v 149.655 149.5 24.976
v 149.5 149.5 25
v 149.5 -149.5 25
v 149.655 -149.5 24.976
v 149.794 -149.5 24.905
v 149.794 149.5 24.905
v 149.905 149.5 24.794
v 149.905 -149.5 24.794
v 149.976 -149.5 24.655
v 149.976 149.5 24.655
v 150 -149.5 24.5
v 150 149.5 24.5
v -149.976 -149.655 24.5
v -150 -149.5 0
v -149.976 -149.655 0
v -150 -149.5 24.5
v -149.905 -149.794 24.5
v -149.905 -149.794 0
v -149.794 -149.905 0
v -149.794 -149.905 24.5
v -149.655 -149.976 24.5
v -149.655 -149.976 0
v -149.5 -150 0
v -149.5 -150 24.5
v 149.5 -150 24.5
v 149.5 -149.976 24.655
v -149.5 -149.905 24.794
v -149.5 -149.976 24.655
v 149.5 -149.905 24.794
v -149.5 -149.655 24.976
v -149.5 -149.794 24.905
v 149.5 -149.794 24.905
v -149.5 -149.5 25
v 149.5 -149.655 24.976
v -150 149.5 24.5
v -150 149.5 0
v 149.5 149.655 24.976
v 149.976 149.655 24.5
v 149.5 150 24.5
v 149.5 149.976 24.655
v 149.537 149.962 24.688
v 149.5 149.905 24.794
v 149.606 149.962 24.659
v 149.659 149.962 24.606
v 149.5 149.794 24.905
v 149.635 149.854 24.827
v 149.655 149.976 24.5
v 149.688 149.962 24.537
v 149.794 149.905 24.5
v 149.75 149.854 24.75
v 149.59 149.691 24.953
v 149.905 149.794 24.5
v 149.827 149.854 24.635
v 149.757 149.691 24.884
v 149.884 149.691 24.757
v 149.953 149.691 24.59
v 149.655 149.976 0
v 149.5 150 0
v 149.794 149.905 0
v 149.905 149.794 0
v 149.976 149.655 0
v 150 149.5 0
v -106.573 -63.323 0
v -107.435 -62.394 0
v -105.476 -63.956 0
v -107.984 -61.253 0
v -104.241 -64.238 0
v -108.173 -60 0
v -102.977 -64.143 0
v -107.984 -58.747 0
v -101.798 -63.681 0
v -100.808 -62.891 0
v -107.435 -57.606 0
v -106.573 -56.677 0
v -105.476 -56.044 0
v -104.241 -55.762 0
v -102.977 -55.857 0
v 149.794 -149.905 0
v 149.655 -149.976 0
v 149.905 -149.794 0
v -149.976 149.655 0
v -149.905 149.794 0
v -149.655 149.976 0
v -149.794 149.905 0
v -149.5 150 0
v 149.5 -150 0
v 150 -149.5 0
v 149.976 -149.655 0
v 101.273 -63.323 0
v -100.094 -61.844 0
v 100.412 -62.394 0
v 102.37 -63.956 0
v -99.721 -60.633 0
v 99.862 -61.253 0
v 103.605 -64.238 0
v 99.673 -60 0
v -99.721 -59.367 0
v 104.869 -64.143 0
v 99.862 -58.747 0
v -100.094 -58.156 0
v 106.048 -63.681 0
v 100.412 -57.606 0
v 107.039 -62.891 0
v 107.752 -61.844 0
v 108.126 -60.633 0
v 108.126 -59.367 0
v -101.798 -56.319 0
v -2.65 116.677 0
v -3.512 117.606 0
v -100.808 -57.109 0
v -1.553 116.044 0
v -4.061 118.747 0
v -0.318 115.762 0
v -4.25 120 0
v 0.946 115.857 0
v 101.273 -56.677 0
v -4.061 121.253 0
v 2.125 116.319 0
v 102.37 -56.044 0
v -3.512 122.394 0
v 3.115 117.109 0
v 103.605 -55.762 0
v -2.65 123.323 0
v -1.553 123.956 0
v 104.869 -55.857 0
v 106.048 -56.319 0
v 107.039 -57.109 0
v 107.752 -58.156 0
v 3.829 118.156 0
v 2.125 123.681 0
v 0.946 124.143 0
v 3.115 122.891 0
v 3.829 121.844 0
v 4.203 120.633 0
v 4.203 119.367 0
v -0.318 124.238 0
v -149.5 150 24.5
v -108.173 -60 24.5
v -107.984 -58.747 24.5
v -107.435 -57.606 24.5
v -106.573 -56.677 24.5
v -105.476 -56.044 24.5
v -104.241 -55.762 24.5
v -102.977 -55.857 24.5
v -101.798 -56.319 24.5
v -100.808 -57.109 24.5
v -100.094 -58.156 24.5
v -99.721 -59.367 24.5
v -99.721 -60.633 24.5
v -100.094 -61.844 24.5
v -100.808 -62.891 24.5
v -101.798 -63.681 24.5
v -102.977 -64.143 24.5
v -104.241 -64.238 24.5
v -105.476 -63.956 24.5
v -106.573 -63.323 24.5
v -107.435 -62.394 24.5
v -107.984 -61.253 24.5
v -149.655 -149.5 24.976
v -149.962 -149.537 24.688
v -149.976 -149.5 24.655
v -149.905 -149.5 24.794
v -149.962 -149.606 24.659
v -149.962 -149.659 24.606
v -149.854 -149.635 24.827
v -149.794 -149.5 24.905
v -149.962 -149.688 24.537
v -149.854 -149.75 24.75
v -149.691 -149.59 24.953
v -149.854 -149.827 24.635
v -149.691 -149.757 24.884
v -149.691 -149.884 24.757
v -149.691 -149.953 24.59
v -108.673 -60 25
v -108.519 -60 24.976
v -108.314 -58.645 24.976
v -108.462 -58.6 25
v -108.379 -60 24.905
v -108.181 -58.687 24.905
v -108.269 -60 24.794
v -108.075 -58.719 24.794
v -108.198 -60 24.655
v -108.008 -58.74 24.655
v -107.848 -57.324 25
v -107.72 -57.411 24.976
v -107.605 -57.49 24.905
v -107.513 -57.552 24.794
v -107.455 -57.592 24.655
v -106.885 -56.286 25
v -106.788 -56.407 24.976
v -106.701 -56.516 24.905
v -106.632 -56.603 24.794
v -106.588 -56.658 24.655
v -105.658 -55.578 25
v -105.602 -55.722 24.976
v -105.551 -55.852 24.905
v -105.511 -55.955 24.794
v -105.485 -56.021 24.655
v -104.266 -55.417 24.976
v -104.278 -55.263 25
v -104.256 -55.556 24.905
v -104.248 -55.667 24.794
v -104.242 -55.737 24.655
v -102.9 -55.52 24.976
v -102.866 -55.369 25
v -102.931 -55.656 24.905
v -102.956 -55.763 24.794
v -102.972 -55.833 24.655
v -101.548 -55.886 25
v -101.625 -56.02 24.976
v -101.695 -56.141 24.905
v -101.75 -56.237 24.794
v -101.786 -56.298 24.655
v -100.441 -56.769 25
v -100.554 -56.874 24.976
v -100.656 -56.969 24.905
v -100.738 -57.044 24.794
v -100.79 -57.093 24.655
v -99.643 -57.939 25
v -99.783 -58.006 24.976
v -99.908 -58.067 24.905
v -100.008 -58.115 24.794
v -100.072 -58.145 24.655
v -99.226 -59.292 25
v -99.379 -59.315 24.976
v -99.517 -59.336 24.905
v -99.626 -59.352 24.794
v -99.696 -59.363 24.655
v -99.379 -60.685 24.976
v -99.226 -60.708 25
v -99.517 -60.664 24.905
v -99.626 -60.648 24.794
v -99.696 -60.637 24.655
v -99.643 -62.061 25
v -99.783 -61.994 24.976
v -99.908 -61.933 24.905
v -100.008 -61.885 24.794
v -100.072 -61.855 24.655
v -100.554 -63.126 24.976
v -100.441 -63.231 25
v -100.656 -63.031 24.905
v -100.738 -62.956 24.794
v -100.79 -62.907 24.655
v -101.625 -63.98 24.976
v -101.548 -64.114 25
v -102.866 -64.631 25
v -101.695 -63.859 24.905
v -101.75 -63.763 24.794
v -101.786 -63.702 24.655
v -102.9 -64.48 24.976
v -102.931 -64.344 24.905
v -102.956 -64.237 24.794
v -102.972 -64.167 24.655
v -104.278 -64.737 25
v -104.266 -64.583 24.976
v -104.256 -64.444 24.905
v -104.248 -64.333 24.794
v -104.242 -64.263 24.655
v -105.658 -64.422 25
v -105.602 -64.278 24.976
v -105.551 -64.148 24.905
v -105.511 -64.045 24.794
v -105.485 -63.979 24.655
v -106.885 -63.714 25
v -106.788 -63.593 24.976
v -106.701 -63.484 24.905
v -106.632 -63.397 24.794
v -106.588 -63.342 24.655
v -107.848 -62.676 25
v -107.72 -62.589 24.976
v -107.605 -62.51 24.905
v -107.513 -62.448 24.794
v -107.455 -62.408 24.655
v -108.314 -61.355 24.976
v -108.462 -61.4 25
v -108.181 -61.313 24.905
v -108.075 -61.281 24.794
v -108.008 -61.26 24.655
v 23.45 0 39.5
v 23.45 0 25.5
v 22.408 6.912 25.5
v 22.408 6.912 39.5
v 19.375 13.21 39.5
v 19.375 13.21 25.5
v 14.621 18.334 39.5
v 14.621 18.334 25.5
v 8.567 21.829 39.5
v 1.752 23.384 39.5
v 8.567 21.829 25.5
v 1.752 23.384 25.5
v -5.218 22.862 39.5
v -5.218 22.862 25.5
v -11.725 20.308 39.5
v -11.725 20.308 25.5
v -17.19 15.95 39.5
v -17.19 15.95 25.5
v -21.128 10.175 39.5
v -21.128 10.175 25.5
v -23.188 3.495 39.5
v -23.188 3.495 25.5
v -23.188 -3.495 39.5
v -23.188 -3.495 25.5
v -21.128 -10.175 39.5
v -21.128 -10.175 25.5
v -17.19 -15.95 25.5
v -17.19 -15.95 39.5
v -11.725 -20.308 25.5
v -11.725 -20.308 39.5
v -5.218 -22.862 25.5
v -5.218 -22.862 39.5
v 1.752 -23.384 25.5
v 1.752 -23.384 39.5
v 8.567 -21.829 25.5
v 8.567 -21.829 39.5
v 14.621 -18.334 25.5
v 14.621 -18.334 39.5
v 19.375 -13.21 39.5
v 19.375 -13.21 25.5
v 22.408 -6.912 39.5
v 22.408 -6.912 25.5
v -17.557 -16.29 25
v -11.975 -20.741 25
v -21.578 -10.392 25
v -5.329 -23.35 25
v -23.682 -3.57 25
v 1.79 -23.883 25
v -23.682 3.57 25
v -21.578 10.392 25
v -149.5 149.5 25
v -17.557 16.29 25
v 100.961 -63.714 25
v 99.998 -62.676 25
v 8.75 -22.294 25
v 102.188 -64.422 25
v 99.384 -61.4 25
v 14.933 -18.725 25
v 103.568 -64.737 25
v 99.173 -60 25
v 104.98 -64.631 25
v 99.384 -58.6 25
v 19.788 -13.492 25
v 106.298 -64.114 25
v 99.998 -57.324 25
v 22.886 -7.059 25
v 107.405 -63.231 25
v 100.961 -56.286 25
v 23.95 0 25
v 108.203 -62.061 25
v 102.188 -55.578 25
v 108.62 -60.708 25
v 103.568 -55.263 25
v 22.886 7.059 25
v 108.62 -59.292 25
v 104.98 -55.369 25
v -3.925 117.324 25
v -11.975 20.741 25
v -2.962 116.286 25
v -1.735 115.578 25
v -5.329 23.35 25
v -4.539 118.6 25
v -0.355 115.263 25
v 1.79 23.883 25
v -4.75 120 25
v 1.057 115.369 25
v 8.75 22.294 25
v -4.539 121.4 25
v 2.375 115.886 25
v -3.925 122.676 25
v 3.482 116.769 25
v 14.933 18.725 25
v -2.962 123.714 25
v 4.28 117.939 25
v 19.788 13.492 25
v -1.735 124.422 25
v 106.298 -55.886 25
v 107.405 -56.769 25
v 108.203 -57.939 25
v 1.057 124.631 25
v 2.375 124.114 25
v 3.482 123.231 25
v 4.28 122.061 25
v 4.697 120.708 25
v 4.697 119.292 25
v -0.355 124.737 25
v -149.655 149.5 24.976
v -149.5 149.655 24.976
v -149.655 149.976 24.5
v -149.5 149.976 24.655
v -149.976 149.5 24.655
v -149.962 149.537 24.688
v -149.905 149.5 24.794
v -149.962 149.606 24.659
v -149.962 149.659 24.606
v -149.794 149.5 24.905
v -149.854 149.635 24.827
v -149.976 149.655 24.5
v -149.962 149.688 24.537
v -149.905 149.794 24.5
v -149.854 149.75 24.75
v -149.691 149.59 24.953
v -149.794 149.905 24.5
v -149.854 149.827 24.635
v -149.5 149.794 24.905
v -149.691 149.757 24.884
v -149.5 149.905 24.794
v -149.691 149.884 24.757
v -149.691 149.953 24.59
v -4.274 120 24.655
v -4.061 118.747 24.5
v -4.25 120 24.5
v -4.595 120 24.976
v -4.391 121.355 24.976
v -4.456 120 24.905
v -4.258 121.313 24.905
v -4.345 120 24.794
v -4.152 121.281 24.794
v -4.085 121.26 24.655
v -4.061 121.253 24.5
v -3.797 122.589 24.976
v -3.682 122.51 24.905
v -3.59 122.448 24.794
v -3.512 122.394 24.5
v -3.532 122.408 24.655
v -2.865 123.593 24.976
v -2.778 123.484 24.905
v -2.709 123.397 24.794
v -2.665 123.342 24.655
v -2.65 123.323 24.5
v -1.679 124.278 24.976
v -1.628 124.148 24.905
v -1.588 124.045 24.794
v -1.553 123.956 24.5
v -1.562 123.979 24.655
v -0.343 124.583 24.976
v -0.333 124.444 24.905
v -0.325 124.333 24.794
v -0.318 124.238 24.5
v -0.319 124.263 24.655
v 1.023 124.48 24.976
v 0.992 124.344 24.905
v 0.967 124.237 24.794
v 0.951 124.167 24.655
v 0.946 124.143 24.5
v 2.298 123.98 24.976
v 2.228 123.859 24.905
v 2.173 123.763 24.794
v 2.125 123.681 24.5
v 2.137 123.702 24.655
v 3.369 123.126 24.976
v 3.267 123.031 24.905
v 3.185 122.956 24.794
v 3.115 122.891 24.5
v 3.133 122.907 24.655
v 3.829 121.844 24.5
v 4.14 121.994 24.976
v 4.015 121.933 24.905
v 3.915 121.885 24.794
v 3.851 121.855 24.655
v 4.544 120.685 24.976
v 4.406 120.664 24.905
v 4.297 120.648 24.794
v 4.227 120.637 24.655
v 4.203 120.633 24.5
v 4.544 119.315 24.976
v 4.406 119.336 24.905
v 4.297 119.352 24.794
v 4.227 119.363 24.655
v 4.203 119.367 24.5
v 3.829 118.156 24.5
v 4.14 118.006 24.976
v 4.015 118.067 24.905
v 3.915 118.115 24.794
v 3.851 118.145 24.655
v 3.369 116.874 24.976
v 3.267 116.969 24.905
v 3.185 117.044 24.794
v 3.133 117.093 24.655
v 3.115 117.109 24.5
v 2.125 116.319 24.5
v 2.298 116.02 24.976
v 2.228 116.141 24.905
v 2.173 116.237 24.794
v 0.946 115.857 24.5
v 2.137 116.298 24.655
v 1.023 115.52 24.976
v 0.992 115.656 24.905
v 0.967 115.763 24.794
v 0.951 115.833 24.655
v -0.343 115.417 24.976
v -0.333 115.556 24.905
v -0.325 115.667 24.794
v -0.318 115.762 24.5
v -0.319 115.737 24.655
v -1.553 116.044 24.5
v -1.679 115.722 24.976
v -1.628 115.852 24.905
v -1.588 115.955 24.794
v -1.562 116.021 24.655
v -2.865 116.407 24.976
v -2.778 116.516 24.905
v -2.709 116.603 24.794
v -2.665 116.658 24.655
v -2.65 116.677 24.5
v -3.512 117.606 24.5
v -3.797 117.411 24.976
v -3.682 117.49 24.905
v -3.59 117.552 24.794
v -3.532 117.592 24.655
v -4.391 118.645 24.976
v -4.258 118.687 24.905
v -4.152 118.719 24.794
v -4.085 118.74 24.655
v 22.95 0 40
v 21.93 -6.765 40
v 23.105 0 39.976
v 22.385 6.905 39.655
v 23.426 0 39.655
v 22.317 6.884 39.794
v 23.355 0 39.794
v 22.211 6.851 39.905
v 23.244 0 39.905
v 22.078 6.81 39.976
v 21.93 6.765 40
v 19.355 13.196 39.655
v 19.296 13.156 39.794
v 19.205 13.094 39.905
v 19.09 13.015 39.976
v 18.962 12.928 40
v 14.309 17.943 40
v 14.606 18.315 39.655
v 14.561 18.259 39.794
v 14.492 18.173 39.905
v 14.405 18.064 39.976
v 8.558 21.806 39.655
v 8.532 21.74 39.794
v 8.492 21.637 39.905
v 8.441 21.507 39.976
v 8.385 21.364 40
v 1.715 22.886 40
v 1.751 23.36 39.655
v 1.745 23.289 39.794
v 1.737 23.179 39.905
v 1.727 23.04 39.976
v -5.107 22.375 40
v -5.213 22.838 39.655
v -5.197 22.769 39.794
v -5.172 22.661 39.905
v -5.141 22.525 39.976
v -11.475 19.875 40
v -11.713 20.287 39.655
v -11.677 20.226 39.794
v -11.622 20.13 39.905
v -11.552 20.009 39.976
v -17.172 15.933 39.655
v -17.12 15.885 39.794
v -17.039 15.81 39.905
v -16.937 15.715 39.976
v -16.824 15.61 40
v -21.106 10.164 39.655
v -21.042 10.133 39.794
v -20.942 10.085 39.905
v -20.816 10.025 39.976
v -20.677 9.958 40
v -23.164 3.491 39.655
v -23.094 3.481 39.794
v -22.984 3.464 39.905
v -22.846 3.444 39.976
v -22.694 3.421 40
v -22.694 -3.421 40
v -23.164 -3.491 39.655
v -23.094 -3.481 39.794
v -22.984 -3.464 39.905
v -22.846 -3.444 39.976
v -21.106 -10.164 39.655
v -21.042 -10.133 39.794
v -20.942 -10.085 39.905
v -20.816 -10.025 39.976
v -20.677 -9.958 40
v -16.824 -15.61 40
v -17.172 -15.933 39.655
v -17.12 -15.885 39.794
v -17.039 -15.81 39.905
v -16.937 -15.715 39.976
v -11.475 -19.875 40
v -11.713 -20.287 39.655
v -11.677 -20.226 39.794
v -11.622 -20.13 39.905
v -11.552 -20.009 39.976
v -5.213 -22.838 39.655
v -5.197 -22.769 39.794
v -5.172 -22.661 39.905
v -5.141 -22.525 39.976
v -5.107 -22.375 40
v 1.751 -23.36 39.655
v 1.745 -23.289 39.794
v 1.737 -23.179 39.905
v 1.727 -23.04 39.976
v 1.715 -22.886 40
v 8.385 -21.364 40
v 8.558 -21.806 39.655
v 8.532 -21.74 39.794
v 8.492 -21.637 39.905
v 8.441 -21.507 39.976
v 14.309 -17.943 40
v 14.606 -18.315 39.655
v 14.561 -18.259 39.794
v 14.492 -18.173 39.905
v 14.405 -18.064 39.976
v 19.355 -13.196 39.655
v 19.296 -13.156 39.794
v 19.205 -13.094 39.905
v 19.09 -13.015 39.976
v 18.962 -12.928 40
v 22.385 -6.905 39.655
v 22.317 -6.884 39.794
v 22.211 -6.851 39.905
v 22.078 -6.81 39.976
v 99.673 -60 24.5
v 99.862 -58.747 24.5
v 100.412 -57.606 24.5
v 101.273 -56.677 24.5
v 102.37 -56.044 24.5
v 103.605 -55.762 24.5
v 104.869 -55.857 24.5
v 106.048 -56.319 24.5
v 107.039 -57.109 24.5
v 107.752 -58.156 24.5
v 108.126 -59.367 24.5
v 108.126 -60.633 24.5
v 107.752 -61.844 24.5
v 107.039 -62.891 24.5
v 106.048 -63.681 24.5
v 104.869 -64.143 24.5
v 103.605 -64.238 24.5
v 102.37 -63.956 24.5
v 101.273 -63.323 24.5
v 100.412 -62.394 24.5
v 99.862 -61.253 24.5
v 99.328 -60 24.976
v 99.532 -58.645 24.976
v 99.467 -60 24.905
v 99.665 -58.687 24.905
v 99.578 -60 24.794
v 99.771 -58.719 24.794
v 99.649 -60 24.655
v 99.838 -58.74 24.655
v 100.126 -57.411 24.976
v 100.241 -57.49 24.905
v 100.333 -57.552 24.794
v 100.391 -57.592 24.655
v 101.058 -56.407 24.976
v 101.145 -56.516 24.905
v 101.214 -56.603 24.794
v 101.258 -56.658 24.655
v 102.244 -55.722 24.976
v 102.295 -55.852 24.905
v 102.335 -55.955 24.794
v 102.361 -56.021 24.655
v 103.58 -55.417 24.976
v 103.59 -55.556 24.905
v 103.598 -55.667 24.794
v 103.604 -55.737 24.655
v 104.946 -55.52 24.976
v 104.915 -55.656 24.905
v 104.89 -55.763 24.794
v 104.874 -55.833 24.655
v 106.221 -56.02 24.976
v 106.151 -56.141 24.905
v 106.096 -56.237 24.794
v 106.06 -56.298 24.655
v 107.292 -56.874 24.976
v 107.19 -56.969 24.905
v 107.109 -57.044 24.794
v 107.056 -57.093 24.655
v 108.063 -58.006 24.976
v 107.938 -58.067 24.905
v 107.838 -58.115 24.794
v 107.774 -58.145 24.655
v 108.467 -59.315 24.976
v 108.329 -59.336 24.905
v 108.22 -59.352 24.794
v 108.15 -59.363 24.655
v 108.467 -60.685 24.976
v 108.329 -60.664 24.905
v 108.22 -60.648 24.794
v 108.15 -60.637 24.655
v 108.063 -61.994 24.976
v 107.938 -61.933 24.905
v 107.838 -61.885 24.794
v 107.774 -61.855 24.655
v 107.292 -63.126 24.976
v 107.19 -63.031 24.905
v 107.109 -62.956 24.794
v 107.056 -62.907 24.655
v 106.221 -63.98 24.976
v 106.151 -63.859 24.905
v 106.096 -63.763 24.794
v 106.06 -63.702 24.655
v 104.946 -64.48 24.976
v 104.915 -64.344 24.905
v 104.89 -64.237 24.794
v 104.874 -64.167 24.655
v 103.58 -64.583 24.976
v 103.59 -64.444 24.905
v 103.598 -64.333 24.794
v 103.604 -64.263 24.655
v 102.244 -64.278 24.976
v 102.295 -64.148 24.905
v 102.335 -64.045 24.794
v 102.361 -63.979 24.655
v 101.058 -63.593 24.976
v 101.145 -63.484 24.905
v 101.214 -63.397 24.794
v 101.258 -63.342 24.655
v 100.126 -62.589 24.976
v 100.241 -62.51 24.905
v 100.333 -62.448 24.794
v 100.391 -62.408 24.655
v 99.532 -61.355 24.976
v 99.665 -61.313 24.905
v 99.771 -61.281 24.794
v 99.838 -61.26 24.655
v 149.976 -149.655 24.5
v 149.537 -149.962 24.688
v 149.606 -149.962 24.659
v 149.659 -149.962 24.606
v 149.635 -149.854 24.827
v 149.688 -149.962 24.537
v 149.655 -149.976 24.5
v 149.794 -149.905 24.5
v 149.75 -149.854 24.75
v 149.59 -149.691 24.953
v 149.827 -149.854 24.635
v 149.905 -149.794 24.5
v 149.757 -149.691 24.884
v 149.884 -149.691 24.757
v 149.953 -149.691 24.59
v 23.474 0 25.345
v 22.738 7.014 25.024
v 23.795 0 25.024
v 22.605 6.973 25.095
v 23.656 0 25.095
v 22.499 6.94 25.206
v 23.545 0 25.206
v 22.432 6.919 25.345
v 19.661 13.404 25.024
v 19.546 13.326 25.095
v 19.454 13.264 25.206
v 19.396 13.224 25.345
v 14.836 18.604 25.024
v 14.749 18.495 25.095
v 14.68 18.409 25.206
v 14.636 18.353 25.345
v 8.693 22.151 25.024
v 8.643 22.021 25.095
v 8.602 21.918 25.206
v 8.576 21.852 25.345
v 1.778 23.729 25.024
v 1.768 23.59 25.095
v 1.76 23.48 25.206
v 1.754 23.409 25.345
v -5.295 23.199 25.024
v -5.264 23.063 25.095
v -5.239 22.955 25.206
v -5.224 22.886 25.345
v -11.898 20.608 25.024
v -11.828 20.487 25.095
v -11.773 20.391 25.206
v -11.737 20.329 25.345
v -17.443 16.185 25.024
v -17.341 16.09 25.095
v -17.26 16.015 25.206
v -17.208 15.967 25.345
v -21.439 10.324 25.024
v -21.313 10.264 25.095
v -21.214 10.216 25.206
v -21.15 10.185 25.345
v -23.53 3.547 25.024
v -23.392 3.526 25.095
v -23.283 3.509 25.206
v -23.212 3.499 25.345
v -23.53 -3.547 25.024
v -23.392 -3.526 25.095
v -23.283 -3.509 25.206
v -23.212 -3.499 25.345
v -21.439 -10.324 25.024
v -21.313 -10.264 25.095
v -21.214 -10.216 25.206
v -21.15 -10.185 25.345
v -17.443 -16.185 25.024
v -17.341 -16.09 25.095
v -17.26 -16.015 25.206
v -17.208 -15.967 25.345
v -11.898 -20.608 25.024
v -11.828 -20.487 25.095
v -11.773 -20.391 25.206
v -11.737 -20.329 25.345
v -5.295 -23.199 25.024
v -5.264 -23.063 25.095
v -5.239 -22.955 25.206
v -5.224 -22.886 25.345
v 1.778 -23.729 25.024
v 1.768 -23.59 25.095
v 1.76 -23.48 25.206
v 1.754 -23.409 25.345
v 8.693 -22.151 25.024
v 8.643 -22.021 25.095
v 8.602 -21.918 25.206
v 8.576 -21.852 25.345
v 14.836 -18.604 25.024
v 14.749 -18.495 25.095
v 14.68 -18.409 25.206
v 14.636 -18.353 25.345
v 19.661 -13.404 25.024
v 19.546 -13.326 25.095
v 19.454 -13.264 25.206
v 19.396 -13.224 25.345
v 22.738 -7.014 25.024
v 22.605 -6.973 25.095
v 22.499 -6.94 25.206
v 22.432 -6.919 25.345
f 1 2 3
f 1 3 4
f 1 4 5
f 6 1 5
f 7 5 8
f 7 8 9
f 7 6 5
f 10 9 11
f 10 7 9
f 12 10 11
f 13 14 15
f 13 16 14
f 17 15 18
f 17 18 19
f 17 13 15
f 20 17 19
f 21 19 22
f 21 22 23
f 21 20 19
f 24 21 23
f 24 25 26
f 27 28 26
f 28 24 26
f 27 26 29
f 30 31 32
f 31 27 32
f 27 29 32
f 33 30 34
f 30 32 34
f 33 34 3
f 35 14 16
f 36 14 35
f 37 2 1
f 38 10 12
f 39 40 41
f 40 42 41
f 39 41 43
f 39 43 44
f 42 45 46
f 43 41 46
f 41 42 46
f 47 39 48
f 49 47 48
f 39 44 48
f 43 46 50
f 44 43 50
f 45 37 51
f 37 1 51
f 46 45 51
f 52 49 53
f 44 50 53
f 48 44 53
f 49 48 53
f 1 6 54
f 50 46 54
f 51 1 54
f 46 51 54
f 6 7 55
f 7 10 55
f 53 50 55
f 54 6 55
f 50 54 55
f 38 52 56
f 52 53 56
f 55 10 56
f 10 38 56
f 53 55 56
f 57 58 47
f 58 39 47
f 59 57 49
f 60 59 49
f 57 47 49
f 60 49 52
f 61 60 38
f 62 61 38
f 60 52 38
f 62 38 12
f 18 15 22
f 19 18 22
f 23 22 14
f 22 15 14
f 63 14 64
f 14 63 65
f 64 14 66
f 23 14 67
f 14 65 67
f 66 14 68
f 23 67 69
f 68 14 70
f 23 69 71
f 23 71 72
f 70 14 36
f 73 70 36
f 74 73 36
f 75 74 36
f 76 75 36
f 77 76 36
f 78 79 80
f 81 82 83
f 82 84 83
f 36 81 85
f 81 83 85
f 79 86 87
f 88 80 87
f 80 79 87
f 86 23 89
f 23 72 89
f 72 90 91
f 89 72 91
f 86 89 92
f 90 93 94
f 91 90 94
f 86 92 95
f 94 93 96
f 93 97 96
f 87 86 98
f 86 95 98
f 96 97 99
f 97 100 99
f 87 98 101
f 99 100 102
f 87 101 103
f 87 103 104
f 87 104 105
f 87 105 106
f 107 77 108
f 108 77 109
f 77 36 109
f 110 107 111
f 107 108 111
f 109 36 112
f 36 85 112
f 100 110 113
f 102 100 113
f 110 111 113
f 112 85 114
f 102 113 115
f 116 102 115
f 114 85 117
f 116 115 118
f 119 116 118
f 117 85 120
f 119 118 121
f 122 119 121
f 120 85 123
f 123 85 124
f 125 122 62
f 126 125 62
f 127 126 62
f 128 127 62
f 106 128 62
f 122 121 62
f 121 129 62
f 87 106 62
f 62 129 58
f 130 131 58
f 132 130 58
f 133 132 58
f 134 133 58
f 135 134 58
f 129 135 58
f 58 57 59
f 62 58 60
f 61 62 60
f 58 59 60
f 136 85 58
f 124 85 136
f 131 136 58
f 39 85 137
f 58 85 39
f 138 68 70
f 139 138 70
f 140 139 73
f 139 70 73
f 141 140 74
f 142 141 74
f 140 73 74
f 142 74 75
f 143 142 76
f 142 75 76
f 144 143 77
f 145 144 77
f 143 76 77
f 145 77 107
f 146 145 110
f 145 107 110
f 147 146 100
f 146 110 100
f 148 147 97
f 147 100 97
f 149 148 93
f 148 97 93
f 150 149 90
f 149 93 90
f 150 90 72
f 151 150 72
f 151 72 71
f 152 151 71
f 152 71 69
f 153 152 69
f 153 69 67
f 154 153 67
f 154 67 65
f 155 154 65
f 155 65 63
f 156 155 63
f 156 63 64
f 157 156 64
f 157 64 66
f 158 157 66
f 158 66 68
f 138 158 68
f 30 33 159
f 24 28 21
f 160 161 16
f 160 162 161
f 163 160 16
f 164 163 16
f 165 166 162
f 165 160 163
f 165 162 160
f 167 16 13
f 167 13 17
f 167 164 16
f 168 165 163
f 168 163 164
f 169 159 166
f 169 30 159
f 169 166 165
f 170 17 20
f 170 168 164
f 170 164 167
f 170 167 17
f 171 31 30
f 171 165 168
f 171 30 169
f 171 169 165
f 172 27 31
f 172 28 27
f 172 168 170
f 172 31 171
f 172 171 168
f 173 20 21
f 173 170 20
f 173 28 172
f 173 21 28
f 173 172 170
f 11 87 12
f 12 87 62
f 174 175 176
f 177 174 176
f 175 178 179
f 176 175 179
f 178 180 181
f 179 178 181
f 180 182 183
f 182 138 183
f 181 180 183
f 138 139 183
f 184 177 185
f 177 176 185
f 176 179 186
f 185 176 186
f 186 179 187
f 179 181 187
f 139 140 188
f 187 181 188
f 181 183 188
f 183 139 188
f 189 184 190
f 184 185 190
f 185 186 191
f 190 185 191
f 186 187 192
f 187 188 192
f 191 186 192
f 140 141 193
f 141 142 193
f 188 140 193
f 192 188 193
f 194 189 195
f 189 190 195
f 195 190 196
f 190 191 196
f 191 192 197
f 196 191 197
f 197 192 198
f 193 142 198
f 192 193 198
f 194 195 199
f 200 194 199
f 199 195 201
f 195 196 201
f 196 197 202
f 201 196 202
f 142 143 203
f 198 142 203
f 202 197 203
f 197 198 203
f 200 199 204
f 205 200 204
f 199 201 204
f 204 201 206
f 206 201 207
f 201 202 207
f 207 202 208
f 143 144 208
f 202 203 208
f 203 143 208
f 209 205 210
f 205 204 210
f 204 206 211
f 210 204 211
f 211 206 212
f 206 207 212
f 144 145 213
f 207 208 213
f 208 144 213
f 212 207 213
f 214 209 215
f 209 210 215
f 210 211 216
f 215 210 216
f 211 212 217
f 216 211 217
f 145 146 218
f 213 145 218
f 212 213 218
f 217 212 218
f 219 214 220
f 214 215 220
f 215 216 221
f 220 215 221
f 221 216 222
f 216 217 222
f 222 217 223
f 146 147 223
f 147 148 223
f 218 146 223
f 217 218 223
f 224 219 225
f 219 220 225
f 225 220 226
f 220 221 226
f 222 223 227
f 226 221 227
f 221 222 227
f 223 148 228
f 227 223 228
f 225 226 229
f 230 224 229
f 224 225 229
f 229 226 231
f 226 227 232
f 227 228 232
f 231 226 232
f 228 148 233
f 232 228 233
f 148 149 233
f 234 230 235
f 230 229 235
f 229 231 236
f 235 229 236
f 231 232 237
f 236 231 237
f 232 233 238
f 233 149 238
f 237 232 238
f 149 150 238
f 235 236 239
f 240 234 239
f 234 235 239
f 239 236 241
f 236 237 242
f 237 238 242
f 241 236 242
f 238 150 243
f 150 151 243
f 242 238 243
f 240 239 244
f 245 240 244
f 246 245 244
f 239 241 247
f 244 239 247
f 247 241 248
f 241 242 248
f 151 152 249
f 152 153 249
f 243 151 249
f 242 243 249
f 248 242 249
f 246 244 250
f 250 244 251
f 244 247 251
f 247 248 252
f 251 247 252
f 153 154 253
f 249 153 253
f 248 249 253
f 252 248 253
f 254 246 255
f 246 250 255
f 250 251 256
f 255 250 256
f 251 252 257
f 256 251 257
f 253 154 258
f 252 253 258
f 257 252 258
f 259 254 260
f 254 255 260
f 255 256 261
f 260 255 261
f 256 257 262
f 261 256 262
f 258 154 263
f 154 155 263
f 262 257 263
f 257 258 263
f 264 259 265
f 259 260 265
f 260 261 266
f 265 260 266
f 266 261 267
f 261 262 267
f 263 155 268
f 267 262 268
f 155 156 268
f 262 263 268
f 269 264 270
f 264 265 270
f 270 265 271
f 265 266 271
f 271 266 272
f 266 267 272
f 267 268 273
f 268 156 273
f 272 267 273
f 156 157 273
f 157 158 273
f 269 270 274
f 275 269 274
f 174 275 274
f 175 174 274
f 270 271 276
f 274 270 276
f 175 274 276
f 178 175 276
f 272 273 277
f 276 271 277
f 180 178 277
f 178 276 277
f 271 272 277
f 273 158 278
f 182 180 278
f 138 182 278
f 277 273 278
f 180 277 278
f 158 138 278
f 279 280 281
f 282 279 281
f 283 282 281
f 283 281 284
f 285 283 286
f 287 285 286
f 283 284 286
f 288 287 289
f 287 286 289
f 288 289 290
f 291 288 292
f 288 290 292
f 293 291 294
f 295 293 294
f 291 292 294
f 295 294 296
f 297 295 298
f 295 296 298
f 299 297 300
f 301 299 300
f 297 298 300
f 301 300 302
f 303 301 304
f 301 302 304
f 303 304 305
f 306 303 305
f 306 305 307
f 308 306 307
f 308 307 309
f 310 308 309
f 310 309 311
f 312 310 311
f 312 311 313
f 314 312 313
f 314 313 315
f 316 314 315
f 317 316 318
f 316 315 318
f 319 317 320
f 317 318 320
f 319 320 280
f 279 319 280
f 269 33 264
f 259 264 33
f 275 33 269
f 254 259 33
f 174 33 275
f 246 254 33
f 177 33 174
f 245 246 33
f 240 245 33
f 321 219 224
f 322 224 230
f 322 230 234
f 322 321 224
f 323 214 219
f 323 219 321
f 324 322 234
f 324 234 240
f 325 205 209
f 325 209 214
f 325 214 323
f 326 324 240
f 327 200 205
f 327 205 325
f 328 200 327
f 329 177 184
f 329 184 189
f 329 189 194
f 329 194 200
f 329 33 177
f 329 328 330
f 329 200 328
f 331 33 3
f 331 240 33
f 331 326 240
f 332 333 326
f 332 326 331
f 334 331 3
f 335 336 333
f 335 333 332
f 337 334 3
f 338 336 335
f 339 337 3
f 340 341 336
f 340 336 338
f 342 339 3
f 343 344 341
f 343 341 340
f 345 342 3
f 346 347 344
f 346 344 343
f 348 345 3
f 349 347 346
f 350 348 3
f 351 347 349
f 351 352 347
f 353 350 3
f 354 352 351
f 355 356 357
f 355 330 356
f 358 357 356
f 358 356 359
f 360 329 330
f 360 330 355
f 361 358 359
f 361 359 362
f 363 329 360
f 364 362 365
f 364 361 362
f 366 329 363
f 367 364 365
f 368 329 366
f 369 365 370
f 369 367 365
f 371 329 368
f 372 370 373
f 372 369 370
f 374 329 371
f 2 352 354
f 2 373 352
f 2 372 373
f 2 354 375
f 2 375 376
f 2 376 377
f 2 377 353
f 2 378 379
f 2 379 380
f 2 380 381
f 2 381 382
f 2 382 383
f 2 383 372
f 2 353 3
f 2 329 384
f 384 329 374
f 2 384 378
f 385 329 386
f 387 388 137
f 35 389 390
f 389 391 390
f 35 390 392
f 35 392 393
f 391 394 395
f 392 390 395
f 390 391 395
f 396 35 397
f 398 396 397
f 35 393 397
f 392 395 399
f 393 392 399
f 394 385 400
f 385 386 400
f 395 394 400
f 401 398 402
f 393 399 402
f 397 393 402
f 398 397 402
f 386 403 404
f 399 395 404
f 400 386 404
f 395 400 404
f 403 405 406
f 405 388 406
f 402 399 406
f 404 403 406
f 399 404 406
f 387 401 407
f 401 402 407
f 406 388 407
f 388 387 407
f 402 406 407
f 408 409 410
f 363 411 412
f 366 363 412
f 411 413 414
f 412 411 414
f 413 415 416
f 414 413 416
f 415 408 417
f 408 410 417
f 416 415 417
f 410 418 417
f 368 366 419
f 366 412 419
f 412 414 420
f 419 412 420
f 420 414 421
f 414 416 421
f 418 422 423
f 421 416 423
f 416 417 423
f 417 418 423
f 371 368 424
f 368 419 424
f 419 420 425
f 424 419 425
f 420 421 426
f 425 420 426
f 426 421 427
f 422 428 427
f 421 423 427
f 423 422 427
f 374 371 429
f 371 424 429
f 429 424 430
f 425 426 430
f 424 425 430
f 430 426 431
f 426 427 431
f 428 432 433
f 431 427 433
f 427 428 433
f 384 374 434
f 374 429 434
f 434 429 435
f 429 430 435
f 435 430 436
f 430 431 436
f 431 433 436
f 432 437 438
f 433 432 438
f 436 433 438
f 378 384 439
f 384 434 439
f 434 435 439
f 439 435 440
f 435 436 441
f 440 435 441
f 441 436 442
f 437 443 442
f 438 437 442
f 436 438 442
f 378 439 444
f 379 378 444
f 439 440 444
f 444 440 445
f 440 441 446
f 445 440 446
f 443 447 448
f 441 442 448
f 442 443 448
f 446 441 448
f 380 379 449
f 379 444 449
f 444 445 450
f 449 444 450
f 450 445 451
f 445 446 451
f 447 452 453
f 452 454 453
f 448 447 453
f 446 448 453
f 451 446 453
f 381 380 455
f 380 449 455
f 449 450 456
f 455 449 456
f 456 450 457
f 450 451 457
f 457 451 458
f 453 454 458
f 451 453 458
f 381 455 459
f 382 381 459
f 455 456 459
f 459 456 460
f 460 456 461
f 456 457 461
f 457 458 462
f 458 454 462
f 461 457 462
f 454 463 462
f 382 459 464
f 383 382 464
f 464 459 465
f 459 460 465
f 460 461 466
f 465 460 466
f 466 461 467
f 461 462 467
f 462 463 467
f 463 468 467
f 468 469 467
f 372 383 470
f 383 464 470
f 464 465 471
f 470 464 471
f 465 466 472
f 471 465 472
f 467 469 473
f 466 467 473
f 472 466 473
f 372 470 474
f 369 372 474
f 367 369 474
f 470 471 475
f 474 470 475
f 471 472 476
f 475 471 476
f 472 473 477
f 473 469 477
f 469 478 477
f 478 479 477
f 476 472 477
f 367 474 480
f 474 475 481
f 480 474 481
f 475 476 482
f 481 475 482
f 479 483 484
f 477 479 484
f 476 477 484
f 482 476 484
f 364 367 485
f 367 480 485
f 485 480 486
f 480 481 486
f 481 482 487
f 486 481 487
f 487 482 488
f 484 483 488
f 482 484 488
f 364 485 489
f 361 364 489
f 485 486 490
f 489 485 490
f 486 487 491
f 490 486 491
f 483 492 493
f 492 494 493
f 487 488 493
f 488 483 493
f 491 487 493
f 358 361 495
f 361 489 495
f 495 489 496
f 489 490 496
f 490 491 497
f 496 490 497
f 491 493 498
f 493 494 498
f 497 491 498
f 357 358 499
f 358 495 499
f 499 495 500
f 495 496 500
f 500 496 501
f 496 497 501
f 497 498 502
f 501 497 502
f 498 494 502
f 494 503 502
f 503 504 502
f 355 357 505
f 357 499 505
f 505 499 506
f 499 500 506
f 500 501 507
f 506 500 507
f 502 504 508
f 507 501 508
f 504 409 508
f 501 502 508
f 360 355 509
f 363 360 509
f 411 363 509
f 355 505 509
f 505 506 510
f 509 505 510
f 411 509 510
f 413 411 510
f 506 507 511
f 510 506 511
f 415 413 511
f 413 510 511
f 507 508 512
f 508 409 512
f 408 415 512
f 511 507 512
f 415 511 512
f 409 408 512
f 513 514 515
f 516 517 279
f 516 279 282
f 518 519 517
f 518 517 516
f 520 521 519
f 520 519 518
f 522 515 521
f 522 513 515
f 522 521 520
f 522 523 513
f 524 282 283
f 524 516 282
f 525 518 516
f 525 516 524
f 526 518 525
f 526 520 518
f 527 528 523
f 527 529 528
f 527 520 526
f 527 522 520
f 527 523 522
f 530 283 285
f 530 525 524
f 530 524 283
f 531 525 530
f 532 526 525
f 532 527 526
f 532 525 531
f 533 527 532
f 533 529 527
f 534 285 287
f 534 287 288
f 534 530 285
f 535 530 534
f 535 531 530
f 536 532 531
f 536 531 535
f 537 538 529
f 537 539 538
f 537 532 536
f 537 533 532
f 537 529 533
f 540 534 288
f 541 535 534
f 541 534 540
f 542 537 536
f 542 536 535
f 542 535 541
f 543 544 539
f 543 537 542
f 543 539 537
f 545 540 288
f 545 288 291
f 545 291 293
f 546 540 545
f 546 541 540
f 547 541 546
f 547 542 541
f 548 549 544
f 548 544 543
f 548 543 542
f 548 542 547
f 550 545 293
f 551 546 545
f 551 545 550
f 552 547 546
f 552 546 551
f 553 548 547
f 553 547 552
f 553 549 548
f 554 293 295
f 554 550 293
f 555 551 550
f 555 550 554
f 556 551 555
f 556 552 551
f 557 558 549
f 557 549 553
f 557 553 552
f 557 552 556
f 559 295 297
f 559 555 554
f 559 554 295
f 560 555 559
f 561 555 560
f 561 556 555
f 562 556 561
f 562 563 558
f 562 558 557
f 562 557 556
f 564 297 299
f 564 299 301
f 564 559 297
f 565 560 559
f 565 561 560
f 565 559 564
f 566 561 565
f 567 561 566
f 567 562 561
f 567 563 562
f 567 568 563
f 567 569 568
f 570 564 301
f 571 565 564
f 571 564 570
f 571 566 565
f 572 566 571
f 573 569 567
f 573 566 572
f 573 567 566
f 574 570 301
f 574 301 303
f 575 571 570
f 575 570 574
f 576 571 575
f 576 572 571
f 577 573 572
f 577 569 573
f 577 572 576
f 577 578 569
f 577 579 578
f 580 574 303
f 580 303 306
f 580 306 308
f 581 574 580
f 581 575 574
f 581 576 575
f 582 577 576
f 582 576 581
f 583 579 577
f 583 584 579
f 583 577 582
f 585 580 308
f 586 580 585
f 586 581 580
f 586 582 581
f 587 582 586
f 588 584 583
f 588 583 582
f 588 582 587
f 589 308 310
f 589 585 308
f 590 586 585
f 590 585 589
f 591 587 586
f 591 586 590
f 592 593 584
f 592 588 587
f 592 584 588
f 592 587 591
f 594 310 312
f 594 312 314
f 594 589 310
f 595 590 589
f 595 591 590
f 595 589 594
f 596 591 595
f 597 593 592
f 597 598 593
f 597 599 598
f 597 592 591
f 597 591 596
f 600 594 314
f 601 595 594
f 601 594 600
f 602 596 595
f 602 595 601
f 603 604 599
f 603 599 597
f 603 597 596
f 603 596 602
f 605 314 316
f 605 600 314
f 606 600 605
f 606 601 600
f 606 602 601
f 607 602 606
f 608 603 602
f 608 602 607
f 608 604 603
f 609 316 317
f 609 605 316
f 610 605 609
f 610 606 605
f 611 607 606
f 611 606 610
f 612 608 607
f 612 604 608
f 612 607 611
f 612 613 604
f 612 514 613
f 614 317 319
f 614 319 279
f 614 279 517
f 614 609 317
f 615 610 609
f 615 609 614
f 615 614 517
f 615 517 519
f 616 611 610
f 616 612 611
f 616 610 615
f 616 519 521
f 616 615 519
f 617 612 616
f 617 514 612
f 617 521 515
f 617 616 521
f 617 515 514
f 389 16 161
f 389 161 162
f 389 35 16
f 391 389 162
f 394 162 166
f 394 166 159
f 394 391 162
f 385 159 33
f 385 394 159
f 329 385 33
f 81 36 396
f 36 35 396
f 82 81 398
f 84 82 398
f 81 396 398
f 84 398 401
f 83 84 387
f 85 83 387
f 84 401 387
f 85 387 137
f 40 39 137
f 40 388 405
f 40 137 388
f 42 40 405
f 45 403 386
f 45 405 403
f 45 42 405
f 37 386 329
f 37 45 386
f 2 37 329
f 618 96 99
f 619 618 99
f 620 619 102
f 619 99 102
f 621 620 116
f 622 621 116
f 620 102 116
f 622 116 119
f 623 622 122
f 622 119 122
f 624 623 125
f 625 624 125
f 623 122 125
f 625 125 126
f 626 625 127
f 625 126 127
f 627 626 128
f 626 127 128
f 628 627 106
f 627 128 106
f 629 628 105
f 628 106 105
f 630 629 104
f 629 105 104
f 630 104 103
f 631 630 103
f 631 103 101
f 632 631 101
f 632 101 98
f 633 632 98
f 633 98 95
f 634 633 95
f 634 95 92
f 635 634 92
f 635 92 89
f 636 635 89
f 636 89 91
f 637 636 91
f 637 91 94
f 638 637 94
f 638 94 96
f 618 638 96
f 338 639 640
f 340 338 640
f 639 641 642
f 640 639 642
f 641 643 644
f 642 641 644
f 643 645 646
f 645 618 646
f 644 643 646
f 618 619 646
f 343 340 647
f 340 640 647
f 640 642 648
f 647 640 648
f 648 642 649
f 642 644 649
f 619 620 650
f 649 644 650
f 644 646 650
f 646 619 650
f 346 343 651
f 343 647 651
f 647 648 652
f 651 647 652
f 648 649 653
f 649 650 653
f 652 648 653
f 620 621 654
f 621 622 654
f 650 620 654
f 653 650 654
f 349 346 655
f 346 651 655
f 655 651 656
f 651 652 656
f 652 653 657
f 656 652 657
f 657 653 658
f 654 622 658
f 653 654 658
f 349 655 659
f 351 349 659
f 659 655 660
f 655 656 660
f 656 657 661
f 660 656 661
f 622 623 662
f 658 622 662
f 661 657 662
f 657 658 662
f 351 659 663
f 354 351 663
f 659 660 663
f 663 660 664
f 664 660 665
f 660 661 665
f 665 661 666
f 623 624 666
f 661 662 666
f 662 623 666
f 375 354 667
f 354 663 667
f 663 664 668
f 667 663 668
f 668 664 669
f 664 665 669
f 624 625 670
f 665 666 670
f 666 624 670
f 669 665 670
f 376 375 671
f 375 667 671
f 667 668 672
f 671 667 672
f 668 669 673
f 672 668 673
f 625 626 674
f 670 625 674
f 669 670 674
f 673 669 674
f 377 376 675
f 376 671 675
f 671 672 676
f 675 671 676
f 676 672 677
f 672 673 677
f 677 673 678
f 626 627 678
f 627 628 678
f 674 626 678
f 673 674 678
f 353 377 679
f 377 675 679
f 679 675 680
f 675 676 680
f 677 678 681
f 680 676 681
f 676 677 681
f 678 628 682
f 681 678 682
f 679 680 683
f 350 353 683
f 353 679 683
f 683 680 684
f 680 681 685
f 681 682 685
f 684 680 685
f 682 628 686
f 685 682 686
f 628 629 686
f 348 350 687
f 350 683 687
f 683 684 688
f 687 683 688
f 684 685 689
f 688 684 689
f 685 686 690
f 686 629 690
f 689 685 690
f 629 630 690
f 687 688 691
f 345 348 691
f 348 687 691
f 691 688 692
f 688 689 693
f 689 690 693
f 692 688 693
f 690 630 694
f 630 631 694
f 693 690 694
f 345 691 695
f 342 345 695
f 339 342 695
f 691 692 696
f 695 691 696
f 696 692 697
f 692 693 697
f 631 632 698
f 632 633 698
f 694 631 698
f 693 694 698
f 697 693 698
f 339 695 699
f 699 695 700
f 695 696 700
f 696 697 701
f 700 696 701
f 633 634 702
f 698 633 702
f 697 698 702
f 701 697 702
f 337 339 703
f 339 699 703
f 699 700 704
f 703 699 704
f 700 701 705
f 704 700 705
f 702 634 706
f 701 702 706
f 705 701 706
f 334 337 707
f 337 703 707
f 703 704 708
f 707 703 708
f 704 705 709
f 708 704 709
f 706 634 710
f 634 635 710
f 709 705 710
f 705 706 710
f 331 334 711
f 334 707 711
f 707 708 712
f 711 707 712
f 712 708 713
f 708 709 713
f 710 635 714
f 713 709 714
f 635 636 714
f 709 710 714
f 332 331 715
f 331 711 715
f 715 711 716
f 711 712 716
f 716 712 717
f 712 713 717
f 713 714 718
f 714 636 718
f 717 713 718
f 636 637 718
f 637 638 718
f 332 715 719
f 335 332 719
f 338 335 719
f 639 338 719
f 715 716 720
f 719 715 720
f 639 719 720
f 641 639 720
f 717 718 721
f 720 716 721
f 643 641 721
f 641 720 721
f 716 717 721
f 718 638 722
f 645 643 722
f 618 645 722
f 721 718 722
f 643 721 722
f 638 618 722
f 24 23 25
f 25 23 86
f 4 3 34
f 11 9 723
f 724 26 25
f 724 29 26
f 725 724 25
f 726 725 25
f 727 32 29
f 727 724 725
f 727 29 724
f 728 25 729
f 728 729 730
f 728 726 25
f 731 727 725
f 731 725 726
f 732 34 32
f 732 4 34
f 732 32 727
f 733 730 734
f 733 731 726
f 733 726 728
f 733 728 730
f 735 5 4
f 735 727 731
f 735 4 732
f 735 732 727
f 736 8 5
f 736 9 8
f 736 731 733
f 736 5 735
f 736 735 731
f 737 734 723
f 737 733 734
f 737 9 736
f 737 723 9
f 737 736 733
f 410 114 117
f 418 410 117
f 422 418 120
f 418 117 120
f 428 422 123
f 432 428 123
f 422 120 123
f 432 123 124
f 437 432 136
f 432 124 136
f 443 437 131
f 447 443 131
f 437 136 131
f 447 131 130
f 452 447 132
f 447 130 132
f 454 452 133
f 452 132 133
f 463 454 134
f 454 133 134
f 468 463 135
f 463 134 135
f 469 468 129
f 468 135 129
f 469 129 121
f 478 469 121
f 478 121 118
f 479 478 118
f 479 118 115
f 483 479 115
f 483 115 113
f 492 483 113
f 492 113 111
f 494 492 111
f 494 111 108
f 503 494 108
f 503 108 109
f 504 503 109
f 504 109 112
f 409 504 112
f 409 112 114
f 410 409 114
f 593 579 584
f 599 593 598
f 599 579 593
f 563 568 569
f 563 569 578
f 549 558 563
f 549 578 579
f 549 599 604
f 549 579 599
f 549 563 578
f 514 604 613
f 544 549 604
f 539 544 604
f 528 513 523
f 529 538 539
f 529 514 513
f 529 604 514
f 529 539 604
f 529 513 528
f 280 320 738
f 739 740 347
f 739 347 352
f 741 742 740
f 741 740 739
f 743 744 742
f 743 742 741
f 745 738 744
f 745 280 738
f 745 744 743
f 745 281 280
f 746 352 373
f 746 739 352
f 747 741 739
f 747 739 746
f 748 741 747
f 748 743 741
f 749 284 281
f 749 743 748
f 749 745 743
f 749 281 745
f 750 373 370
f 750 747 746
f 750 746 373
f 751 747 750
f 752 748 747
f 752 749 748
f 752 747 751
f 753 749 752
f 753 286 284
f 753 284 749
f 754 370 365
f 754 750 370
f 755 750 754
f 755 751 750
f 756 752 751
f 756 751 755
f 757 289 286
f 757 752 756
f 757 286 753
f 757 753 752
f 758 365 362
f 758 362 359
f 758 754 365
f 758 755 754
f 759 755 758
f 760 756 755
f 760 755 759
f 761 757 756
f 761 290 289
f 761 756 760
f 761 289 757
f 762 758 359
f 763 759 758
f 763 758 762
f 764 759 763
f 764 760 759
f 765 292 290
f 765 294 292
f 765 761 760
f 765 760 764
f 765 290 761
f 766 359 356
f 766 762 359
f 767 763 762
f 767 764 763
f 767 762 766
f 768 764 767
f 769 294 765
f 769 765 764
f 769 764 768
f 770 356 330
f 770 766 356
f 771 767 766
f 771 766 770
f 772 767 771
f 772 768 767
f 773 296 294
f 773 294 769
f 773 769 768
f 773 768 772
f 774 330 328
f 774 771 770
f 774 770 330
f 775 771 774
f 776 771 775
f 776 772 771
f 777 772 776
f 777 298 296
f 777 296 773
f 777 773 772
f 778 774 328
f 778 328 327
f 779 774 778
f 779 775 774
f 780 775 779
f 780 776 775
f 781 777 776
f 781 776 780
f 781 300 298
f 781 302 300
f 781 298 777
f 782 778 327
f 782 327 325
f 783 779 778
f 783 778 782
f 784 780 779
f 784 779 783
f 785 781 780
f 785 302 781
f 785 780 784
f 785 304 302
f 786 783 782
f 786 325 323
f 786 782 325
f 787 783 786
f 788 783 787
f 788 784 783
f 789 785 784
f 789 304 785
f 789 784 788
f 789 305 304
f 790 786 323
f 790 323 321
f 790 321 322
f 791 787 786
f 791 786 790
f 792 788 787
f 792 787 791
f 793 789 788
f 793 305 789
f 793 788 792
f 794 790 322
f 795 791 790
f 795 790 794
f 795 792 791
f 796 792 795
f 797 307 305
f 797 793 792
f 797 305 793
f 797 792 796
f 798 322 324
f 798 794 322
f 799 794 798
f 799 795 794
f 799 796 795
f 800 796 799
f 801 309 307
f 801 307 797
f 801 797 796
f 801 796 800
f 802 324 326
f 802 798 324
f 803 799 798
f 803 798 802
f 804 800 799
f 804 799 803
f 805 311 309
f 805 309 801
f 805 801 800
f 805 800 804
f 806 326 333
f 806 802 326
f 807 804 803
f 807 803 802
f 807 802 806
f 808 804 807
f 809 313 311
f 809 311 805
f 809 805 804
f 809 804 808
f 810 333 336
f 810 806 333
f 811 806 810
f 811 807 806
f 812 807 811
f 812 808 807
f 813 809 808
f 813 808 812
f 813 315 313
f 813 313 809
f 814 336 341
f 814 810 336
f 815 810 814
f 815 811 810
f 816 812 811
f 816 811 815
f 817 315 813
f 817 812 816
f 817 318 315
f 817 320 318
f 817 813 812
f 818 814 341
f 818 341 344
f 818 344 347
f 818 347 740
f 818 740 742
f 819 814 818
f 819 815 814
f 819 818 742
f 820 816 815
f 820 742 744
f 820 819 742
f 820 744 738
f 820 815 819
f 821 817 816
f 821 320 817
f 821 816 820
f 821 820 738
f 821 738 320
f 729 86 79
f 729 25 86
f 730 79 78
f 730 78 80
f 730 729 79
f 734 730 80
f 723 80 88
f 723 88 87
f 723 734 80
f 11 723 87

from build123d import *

# Parameters (mm, degrees)
F0_W     = 300
F0_H     = 300
F1_DEPTH = 25
F2_R     = 23.45
F3_DEPTH = 15
F5_D     = 8.5
F6_R     = 0.5


with BuildPart() as f1:
    # F0 (on Top) → F1 (new body)
    with BuildSketch(Plane.XY):
        Rectangle(F0_W, F0_H)
    extrude(amount=F1_DEPTH)

    # F2 (on face) → F3 (join)
    with BuildSketch(Plane.XY.offset(25)):
        Circle(F2_R)
    extrude(amount=F3_DEPTH)

    # F5 (through all)
    with Locations(Plane.XY.offset(25)):
        with Locations((0, 120), (103.9230484541, -60), (-103.9230484541, -60)):
            Hole(F5_D / 2)

    # F6
    f6_edges = [f1.edges().sort_by_distance(p)[0] for p in [
        (-23.45, 0, 40),
        (150, 0, 25),
        (0, -150, 25),
        (0, 150, 25),
        (-150, 0, 25),
        (-108.173048, -60, 25),
        (-23.45, 0, 25),
        (99.673048, -60, 25),
        (-4.25, 120, 25),
        (150, -150, 12.5),
        (150, 150, 12.5),
        (-150, -150, 12.5),
        (-150, 150, 12.5),
    ]]
    fillet(f6_edges, radius=F6_R)


solid = f1.part
